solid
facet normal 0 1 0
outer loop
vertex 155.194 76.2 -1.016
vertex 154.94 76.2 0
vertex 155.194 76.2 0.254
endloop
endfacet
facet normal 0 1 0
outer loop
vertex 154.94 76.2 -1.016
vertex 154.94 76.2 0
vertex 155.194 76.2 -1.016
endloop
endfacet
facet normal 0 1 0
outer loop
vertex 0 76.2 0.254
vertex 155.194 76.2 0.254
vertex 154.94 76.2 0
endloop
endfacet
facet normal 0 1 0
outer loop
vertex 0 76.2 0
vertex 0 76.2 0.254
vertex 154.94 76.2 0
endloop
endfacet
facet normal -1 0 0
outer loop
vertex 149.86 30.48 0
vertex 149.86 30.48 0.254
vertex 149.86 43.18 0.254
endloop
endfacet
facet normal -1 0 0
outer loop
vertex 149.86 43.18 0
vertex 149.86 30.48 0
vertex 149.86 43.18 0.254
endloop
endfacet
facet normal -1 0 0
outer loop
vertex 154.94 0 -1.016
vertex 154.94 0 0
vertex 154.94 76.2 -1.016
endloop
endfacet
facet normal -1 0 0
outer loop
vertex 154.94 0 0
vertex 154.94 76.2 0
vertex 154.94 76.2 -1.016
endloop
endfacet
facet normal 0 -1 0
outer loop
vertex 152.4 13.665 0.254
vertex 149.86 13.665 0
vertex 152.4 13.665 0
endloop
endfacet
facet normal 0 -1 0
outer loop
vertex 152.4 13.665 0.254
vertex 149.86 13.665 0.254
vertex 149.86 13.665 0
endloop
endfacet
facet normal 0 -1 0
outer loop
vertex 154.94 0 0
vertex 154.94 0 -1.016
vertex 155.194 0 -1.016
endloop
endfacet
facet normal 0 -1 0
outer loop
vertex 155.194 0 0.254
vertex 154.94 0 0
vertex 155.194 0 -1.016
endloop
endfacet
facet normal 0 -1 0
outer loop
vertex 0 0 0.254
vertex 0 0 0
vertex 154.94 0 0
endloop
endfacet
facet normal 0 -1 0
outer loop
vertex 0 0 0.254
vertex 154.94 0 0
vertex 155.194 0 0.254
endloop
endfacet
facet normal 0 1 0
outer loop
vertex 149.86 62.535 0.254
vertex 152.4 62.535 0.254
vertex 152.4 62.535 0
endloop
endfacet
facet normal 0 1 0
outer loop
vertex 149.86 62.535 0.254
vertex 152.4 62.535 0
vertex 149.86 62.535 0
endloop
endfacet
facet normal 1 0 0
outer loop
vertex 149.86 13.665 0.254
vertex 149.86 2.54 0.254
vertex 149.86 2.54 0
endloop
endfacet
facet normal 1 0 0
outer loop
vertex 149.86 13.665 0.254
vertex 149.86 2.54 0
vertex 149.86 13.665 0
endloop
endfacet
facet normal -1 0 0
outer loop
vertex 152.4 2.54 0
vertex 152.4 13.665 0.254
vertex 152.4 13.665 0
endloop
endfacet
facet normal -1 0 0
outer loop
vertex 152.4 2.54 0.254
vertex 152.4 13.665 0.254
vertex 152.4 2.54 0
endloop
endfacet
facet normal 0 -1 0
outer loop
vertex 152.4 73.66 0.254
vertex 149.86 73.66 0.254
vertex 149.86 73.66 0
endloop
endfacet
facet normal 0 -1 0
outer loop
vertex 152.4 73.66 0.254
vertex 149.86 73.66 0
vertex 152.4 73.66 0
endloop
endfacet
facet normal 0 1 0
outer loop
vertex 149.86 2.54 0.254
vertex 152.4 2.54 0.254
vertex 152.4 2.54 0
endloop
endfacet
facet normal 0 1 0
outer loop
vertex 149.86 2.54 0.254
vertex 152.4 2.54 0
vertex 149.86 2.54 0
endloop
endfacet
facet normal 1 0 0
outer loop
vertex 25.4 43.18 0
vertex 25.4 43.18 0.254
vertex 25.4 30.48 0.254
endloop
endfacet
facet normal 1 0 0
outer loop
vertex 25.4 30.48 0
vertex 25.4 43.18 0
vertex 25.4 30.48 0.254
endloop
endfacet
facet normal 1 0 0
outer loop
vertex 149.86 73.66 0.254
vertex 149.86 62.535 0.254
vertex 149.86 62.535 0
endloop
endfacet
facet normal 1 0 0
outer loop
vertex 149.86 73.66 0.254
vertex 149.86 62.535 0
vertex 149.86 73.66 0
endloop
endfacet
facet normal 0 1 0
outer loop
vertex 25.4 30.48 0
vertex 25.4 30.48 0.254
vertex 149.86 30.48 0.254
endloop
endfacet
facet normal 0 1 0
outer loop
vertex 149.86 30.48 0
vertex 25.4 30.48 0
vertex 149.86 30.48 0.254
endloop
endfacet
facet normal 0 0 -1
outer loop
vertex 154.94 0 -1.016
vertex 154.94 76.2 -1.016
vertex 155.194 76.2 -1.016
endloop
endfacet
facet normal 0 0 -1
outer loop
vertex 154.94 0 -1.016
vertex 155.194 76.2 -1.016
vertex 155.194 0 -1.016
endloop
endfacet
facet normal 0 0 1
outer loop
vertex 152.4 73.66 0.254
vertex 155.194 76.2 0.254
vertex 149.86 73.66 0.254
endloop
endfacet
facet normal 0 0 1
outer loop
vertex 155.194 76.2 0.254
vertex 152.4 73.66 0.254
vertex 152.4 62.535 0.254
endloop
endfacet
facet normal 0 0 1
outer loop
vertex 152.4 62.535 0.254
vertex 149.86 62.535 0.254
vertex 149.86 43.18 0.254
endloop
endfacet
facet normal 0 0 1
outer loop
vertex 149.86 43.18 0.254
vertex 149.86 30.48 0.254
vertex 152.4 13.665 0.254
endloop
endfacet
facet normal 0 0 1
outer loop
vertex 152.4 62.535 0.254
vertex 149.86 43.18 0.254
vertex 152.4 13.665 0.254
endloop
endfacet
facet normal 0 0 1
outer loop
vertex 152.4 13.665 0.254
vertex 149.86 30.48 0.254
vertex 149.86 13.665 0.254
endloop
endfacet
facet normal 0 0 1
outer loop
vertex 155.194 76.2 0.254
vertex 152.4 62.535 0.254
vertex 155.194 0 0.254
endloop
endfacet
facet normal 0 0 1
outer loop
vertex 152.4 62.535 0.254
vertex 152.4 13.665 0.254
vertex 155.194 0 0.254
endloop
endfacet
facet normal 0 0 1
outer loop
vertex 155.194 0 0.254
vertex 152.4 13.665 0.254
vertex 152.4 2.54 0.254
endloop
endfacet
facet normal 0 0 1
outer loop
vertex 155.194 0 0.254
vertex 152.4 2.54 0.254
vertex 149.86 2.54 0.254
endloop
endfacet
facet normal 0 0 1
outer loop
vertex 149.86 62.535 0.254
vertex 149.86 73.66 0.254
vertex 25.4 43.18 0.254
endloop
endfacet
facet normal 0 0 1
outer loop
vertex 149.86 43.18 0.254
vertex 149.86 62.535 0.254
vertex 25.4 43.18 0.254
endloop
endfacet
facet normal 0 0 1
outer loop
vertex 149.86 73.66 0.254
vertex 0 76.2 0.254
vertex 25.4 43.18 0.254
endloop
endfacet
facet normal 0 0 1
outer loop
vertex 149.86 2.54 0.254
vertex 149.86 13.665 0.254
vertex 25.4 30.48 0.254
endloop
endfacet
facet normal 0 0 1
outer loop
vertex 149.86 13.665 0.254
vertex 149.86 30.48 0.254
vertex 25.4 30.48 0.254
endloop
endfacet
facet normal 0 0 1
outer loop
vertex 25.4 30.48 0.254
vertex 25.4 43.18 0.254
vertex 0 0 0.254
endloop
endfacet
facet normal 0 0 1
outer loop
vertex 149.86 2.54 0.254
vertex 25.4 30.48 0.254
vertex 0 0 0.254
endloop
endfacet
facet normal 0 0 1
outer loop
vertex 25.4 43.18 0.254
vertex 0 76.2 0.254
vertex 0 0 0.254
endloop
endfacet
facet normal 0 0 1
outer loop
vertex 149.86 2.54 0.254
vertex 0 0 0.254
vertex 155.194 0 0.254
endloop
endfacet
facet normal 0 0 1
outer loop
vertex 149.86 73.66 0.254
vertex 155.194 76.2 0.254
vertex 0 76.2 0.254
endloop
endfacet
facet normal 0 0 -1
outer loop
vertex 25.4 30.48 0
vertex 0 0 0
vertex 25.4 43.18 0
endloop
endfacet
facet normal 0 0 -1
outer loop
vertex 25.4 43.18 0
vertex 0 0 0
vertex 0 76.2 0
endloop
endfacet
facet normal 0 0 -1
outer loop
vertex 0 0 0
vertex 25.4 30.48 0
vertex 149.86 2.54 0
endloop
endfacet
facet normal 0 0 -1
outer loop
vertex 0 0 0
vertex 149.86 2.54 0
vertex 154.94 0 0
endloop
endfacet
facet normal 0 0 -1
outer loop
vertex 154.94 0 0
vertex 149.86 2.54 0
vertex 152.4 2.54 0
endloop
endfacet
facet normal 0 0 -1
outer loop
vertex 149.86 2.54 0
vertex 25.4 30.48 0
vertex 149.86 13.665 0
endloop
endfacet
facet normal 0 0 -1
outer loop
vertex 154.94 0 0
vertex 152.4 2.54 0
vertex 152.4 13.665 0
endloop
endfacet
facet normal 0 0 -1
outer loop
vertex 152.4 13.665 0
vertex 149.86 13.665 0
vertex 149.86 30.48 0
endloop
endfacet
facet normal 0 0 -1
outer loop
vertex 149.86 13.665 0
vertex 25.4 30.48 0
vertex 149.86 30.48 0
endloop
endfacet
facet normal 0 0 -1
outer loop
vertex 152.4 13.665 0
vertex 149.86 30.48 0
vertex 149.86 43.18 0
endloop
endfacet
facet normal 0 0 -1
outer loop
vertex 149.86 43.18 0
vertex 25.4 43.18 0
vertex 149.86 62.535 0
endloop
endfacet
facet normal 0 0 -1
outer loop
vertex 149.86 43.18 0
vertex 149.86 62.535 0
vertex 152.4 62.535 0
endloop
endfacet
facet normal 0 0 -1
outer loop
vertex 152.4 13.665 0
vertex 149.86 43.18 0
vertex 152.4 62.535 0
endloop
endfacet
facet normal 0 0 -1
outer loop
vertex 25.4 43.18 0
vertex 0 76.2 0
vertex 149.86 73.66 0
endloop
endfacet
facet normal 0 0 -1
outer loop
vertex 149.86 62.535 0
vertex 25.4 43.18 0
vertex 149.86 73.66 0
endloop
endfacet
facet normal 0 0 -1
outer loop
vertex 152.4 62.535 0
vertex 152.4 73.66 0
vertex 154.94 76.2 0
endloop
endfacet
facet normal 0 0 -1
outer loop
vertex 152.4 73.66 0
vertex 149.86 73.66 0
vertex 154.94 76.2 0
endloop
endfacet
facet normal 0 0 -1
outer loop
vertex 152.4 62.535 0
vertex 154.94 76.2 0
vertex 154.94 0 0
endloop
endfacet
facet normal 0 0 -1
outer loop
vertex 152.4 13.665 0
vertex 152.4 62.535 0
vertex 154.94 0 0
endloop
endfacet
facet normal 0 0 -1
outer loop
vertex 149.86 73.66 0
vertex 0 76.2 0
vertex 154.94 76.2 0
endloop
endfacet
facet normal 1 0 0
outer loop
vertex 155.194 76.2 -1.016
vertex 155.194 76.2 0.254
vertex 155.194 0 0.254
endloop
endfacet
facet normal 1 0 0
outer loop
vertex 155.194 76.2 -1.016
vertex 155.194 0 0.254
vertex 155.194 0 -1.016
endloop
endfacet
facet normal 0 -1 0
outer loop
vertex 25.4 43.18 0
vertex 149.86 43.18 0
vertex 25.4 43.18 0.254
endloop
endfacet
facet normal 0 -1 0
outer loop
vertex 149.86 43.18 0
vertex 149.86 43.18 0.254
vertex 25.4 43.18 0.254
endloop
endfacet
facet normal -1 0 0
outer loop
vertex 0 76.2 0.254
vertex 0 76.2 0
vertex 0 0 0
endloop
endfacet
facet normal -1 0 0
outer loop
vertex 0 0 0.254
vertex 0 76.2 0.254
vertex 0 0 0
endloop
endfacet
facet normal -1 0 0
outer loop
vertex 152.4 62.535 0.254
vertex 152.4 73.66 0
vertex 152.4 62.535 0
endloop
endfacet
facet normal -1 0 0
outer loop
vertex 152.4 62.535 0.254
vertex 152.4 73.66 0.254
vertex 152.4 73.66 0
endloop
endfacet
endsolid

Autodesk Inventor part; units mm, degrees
ref_plane "YZ Plane" through (0, 0, 0) normal (1, 0, 0) x (0, 1, 0)
ref_plane "XZ Plane" through (0, 0, 0) normal (0, 1, 0) x (-1, 0, 0)
ref_plane "XY Plane" through (0, 0, 0) normal (0, 0, 1) x (1, 0, 0)
sketch "Sketch1" plane through (0, 0, 0) normal (0, 0, 1) x (1, 0, 0)
  line L0 (0, 0) -> (154.94, 0)
  line L1 (154.94, 0) -> (154.94, 76.2)
  line L2 (154.94, 76.2) -> (0, 76.2)
  line L3 (0, 76.2) -> (0, 0)
  dimension "d0" = 76.2
  dimension "d1" = 154.94
extrude "Extrusion1" add sketch "Sketch1" along normal blind 0.254
sketch "Sketch2" plane through (0, 0, 0.254) normal (0, 0, 1) x (1, 0, 0)
  line L0 (149.86, 73.66) -> (152.4, 73.66)
  line L1 (152.4, 73.66) -> (152.4, 62.5348)
  line L2 (152.4, 62.5348) -> (149.86, 62.5348)
  line L3 (149.86, 62.5348) -> (149.86, 73.66)
  line L4 (149.86, 13.6652) -> (152.4, 13.6652)
  line L5 (152.4, 13.6652) -> (152.4, 2.54)
  line L6 (152.4, 2.54) -> (149.86, 2.54)
  line L7 (149.86, 2.54) -> (149.86, 13.6652)
  line L8 (154.94, 0) -> (154.94, 76.2) projected
  line L9 (154.94, 76.2) -> (0, 76.2) projected
  line L10 (0, 0) -> (154.94, 0) projected
  point P0 (151.13, 73.66)
  point P1 (151.13, 2.54)
  dimension "d4" = 11.1252
  dimension "d5" = 2.54
  dimension "d6" = 2.54
  dimension "d7" = 2.54
  dimension "d8" = 2.54
  dimension "d9" = 11.1252
extrude "Extrusion2" cut sketch "Sketch2" against normal blind 25.4
sketch "Sketch3" plane through (154.94, 0, 0) normal (1, 0, 0) x (0, 0, -1)
  line L0 (-0.254, 76.2) -> (-0.254, 0) projected
  line L1 (-0.254, 76.2) -> (1.016, 76.2)
  line L2 (1.016, 76.2) -> (1.016, 0)
  line L3 (1.016, 0) -> (-0.254, 0)
  line L4 (-0.254, 0) -> (-0.254, 76.2)
  point P0 (0, 0)
  dimension "d12" = 1.27
extrude "Extrusion3" add sketch "Sketch3" along normal blind 0.254
sketch "Sketch4" plane through (0, 0, 0.254) normal (0, 0, 1) x (1, 0, 0)
  line L0 (149.86, 43.18) -> (25.4, 43.18)
  line L1 (25.4, 43.18) -> (25.4, 30.48)
  line L2 (25.4, 30.48) -> (149.86, 30.48)
  line L3 (149.86, 30.48) -> (149.86, 43.18)
  line L4 (149.86, 62.5348) -> (149.86, 73.66) projected
  line L5 (0, 76.2) -> (155.194, 76.2) projected
  line L6 (0, 76.2) -> (0, 0) projected
  dimension "d15" = 12.7
  dimension "d16" = 0
  dimension "d17" = 33.02
  dimension "d18" = 25.4
extrude "Extrusion4" cut sketch "Sketch4" against normal blind 25.4
properties part number "Front Back side"
